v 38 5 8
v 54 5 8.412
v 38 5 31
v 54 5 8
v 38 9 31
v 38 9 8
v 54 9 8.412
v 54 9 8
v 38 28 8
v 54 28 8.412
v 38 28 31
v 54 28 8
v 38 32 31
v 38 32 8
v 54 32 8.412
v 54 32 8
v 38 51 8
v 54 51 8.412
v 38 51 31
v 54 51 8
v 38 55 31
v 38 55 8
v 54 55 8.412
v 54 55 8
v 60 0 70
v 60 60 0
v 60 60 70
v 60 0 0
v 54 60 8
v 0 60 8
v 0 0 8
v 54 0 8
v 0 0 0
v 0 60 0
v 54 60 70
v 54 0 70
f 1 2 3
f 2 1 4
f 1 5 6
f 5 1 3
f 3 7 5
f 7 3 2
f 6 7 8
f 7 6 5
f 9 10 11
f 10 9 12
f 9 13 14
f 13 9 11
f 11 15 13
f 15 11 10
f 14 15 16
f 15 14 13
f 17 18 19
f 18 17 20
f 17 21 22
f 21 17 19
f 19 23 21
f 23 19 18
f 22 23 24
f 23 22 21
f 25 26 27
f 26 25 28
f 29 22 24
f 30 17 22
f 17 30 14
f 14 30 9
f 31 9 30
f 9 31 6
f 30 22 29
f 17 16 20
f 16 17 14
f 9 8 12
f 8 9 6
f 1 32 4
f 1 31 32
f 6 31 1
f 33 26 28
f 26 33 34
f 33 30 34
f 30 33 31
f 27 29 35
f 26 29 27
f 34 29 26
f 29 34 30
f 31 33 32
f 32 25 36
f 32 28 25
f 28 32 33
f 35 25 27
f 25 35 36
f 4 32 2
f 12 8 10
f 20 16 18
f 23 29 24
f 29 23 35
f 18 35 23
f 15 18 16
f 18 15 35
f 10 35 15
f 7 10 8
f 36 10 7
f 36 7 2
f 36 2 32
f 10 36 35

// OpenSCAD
$fn = 32;

// ----------------------------------------------------------------------
// Rib bracket: 3-gusset L bracket
// ----------------------------------------------------------------------

// --- parameters (mm) ---
base_l = 60;              // foot length, X
base_w = 60;              // foot width, Y
base_t = 8;               // foot thickness
plate_t = 6;              // upright plate thickness
plate_h = 70;             // overall height
gus_l = 16;               // gusset leg along the foot
gus_h = 24;               // gusset height
gus_t = 4;                // gusset thickness
gus_edge = 5;             // gusset margin from the foot edge
n_gus = 3;                // gusset count
fit_tol = 0.05;           // tolerance for press fits, mm
free_tol = 0.3;           // tolerance for clearance fits, mm

gus_pitch = (base_w - 2 * gus_edge - gus_t) / (n_gus - 1);  // gusset pitch

union() {
  cube([base_l, base_w, base_t]);
  translate([base_l - plate_t, 0, base_t - 1])
    cube([plate_t, base_w, plate_h - base_t + 1]);
  for (i = [0 : n_gus - 1])
    translate([base_l - plate_t - gus_l, gus_edge + i * gus_pitch, base_t - 1])
      rotate([-90, 0, 0])
        linear_extrude(height = gus_t)
          polygon(points = [[0, 0], [gus_l + 1, 0], [0, -gus_h]]);
}
